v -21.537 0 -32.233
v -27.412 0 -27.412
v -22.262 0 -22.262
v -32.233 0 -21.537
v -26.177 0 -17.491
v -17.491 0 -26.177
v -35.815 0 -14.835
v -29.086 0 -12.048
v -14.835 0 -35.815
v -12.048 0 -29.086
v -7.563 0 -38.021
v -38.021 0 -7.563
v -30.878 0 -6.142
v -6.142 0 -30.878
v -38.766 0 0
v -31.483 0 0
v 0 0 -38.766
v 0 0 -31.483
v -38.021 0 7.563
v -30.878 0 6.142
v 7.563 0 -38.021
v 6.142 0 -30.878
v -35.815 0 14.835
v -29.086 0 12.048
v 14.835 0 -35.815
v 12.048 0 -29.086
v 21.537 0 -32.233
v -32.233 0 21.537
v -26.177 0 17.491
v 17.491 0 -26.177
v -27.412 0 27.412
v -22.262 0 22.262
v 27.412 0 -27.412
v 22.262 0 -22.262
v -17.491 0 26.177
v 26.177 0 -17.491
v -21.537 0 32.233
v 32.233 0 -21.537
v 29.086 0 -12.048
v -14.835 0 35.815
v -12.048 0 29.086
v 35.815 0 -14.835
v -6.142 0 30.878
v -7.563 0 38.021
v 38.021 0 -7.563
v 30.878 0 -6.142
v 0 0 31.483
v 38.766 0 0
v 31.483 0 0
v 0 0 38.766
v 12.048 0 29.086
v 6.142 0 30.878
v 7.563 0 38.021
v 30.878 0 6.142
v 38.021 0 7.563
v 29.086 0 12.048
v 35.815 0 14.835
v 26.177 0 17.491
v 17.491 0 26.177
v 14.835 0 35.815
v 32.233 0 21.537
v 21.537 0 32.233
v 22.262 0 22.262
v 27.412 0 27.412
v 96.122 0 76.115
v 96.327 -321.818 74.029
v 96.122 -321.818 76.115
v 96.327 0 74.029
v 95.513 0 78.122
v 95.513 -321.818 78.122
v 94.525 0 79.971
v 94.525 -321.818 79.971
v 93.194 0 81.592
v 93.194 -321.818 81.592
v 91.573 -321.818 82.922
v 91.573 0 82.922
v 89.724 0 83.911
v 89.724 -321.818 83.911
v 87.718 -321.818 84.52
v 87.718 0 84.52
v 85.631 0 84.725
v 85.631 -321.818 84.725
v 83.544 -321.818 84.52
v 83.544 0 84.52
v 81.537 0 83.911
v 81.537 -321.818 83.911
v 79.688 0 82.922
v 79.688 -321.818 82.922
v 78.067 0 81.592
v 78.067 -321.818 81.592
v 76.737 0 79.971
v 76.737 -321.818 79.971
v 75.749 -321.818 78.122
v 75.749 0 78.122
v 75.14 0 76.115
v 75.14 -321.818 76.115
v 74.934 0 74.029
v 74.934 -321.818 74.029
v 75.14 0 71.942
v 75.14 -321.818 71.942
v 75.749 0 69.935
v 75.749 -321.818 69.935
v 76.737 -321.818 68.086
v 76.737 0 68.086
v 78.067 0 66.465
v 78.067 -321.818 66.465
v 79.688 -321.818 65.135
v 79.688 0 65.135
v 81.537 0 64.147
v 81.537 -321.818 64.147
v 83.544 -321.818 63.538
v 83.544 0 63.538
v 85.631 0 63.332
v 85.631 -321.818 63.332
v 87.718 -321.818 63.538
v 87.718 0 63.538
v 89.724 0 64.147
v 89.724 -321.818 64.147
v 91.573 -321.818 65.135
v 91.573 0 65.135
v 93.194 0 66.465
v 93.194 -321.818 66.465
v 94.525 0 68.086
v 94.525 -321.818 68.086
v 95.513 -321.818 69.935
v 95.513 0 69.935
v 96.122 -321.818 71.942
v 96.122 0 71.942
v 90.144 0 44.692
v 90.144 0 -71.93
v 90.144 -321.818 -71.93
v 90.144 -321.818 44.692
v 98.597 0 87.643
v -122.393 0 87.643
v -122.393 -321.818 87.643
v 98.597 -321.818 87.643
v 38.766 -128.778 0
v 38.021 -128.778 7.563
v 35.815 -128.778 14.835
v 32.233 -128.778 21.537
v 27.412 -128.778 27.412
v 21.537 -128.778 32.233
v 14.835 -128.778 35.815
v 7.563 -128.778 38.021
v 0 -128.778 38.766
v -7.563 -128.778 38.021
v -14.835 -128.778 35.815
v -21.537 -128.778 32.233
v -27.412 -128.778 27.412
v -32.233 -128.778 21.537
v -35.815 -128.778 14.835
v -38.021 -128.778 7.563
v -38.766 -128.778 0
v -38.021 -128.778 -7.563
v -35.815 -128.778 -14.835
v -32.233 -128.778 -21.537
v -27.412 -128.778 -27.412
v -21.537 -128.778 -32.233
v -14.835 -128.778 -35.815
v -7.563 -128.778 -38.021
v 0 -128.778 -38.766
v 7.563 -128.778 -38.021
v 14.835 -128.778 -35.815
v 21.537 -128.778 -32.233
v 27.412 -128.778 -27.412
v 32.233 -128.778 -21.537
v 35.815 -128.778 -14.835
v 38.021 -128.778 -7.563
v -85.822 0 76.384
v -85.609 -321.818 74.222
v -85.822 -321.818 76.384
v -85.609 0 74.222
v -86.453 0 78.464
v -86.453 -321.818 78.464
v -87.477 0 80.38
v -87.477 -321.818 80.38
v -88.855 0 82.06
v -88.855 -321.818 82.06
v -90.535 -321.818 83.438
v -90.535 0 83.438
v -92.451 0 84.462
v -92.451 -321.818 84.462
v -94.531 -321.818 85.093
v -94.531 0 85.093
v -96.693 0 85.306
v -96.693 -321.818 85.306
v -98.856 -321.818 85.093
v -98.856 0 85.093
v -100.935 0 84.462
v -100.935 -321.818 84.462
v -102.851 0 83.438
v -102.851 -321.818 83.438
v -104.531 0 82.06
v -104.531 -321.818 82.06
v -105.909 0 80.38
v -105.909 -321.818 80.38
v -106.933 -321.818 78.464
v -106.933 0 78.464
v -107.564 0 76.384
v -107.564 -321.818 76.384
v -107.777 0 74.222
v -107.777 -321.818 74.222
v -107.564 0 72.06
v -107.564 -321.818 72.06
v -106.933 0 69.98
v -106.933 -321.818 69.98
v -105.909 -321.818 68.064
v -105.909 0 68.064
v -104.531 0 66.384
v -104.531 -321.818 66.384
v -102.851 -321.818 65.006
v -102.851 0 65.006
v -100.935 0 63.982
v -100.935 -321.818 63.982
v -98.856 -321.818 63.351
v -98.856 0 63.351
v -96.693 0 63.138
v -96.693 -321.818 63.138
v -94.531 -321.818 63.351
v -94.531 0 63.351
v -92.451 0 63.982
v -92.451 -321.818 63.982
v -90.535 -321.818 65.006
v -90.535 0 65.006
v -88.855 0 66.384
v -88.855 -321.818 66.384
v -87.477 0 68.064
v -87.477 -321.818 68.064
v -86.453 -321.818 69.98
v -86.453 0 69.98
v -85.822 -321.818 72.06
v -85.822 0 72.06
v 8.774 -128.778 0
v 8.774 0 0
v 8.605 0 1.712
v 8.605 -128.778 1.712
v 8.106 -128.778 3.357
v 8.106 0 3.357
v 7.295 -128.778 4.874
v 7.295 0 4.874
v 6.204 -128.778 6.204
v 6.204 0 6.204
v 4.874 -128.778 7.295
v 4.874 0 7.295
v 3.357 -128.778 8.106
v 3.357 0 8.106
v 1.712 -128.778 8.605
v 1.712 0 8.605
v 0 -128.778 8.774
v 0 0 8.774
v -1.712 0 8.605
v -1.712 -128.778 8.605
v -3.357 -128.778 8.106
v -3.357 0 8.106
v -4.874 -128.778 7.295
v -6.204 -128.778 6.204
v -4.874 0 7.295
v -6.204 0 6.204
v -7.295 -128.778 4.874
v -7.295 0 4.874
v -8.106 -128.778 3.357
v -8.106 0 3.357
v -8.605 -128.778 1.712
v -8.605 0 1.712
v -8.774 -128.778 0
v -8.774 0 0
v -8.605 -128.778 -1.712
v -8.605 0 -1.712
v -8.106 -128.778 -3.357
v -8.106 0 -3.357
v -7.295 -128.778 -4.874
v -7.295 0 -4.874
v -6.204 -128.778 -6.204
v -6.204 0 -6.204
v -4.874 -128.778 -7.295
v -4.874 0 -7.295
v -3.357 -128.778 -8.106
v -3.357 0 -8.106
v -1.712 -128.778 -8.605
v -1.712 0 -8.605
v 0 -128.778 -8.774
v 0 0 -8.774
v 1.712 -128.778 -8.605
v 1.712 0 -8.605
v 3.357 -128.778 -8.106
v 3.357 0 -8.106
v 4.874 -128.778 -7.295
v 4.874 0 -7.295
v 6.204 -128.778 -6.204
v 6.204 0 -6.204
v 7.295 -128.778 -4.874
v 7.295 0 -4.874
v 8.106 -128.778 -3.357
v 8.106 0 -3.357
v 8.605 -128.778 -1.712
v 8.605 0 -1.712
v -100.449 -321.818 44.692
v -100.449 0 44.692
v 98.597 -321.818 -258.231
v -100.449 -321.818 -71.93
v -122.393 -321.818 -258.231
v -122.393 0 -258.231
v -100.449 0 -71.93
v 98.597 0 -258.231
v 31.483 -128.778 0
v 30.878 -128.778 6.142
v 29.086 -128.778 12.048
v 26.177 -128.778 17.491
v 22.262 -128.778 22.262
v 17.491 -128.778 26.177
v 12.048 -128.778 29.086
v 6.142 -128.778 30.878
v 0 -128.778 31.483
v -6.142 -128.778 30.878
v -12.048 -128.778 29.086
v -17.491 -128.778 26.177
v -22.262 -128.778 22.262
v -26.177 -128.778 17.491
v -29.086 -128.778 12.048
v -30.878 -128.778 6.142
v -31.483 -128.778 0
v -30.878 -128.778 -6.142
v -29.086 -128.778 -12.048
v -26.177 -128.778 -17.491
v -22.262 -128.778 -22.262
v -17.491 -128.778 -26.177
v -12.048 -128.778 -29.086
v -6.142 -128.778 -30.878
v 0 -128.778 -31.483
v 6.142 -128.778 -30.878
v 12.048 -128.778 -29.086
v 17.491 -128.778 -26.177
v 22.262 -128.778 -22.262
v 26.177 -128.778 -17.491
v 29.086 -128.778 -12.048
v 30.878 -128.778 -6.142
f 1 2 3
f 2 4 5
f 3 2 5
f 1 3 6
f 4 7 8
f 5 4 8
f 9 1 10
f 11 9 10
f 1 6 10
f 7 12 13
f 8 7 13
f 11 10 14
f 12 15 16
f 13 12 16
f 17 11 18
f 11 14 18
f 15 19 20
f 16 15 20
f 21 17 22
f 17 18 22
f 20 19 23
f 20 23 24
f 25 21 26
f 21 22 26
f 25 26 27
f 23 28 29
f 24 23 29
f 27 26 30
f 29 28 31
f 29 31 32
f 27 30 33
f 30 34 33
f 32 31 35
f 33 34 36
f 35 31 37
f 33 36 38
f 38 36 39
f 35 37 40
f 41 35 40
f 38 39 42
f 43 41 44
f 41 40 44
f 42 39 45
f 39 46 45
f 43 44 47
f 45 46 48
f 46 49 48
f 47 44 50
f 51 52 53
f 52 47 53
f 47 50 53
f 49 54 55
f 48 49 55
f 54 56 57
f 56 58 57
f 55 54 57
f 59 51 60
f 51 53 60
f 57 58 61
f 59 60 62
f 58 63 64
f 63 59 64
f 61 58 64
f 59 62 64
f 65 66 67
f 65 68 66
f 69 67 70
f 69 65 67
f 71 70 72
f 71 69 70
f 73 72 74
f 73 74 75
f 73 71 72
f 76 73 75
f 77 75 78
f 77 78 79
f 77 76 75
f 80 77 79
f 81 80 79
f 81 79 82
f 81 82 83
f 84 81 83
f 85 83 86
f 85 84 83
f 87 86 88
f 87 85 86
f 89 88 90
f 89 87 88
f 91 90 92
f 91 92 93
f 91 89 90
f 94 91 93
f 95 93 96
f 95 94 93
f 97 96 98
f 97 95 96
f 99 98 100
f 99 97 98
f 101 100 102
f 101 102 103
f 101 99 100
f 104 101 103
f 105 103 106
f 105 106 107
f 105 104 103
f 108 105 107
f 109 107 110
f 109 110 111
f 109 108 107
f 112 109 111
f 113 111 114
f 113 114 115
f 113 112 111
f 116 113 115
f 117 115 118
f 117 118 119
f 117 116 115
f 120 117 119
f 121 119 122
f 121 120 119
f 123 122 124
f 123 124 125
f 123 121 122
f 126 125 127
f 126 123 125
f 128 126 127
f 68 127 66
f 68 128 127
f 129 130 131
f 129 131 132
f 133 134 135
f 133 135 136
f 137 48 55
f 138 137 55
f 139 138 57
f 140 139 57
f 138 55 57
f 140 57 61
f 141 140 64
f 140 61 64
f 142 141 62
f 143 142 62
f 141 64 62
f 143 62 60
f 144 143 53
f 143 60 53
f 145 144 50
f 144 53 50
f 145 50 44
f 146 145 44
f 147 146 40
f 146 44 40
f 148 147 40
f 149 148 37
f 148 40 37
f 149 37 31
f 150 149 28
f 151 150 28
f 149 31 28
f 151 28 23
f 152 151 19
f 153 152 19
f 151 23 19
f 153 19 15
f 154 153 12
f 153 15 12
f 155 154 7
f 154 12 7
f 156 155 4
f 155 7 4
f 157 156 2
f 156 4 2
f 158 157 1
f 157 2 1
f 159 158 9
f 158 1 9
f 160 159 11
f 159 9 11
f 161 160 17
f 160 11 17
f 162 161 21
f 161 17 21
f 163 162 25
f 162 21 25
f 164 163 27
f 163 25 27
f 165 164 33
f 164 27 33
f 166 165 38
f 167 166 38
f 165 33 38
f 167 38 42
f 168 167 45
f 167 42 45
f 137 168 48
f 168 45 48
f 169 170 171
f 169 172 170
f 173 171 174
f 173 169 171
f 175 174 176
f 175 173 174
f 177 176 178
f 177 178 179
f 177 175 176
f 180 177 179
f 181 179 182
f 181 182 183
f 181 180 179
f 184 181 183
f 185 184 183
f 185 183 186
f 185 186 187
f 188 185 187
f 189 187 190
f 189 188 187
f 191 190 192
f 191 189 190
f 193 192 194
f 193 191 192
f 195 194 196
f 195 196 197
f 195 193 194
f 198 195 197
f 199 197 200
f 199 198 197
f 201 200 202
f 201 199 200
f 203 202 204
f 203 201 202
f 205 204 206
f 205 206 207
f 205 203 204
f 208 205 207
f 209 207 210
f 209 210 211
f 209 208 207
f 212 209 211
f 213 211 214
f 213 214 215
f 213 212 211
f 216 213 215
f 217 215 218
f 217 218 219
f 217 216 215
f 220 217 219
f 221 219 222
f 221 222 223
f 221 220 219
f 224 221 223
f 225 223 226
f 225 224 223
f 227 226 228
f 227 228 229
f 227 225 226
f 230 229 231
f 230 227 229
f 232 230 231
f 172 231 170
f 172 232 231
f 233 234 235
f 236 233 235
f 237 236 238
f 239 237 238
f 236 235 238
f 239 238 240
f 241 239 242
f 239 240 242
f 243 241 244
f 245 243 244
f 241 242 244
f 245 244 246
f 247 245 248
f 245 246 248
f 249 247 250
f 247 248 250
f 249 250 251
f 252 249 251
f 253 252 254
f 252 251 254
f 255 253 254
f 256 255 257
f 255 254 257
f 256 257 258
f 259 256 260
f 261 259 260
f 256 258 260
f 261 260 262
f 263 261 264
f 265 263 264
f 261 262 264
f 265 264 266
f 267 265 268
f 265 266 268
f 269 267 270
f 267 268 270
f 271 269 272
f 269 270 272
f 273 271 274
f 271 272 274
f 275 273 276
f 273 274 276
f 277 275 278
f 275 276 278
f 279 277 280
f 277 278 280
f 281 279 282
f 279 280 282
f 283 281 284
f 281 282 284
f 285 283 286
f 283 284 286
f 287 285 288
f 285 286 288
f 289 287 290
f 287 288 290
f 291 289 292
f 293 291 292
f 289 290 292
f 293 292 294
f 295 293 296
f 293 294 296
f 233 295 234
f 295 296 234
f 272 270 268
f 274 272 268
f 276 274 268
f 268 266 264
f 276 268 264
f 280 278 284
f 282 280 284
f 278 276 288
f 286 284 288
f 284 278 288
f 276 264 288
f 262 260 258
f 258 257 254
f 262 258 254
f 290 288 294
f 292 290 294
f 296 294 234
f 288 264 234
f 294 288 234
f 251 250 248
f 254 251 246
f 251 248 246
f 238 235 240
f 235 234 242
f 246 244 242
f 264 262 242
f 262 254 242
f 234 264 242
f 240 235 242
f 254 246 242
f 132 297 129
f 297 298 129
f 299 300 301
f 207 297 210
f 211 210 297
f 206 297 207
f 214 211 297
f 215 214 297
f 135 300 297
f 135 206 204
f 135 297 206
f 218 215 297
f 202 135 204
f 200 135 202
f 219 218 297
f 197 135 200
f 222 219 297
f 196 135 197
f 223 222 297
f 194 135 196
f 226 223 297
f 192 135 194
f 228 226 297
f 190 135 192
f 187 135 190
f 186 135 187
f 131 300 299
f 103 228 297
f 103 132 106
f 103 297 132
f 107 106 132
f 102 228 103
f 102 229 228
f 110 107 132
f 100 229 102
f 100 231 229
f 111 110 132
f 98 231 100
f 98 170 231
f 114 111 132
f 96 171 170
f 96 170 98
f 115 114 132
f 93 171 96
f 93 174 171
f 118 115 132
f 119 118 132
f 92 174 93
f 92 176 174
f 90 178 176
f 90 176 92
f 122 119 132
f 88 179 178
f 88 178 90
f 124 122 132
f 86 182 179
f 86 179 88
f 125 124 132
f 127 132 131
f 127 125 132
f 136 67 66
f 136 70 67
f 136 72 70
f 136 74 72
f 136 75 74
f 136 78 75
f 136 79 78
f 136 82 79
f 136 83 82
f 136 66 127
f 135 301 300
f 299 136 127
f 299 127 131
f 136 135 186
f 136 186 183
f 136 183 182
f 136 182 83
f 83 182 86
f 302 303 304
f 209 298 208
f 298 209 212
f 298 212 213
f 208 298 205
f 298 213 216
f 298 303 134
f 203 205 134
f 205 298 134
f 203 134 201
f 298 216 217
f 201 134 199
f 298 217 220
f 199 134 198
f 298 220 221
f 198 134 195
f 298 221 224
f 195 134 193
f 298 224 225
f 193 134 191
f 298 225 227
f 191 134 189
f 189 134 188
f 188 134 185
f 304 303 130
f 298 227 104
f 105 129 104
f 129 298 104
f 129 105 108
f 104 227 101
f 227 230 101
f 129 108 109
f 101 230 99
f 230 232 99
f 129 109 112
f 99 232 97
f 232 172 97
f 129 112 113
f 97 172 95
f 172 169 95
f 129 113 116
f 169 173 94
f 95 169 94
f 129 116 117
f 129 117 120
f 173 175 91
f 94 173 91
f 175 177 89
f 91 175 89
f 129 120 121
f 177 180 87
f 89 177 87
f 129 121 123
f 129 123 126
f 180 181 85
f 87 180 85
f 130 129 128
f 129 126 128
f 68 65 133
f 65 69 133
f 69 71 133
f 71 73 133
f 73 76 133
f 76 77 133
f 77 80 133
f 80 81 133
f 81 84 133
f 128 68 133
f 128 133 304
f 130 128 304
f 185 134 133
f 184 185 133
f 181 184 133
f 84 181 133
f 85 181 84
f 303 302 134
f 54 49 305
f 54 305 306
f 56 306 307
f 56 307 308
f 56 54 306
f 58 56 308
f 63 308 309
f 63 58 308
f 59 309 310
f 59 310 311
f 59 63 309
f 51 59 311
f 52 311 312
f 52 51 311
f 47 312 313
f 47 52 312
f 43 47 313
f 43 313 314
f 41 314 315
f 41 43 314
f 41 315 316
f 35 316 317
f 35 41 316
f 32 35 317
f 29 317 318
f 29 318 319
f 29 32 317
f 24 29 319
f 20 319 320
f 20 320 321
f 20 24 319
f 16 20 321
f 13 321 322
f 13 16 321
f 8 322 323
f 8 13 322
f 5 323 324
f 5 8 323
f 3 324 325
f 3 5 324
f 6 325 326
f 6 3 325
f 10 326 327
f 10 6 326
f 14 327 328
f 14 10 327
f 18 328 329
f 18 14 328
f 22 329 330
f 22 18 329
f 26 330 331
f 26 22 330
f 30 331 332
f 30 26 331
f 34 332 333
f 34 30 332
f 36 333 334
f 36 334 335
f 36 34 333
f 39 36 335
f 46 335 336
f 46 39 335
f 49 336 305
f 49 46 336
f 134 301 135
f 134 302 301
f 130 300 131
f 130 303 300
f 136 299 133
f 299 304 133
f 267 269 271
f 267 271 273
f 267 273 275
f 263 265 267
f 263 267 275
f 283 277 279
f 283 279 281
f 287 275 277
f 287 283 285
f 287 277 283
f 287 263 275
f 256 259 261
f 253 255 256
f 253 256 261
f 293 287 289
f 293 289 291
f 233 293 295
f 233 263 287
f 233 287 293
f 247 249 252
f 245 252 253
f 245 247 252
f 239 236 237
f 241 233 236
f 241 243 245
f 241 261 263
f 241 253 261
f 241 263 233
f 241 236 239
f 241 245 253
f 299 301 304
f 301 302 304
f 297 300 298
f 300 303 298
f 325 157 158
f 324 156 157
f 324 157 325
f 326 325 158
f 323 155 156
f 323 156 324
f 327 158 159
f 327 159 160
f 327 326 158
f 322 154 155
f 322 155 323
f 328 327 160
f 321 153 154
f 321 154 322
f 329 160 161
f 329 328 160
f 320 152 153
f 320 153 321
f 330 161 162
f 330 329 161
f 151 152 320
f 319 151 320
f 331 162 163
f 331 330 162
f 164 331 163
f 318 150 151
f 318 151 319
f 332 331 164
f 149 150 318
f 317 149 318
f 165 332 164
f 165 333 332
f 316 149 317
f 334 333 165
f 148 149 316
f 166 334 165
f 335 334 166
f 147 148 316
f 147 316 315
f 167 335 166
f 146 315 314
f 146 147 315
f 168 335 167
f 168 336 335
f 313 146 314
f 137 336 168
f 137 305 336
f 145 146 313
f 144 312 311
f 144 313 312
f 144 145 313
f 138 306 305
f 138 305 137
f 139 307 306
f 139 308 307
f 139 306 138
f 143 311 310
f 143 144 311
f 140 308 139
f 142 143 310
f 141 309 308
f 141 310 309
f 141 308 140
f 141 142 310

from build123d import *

# Parameters (mm, degrees)
F0_W     = 220.9899574518
F0_H     = 131.3110403717
F0_W_2   = 190.593034029
F0_H_2   = 116.621889174
F0_H_3   = 37.5250019133
F0_R     = 11.0841041045
F0_R_2   = 10.6963594921
F1_DEPTH = 128.778
F0_R_3   = 38.7661660701
F0_R_4   = 31.4827713073
F0_R_5   = 8.7735073829
F2_DEPTH = 177.038
F3_DEPTH = 193.04


with BuildPart() as f1:
    # F0 (on Front) → F1 (new body)
    with BuildSketch(Plane.XZ):
        with Locations((-11.897906661, -15.5370328575)):
            Rectangle(F0_W, F0_H)
        with Locations((-5.1528438926, -13.618927449)):
            Rectangle(F0_W_2, F0_H_2, mode=Mode.SUBTRACT)
        with Locations((-11.897906661, 68.8809882849)):
            Rectangle(F0_W, F0_H_3)
        with Locations((-96.6931059957, 74.2219984531)):
            Circle(F0_R, mode=Mode.SUBTRACT)
        with Locations((85.6308117509, 74.0287080407)):
            Circle(F0_R_2, mode=Mode.SUBTRACT)
    extrude(amount=F1_DEPTH)

    # F2 (add): a face of the model
    f2_faces = [f1.faces().sort_by_distance(p)[0] for p in [
        (-11.897906661, -64.389, -81.1925530434),
    ]]
    extrude(f2_faces, amount=F2_DEPTH)

    # F3 (add): a face of the model
    f3_faces = [f1.faces().sort_by_distance(p)[0] for p in [
        (-14.7457593818, -128.778, -117.3157060227),
    ]]
    extrude(f3_faces, amount=F3_DEPTH)


with BuildPart() as f1b:
    # F0 (on Front) → F1, piece 2 (new body)
    with BuildSketch(Plane.XZ):
        Circle(F0_R_3)
        Circle(F0_R_4, mode=Mode.SUBTRACT)
    extrude(amount=F1_DEPTH)


with BuildPart() as f1c:
    # F0 (on Front) → F1, piece 3 (new body)
    with BuildSketch(Plane.XZ):
        Circle(F0_R_5)
    extrude(amount=F1_DEPTH)


solid = Compound([f1.part, f1b.part, f1c.part])
